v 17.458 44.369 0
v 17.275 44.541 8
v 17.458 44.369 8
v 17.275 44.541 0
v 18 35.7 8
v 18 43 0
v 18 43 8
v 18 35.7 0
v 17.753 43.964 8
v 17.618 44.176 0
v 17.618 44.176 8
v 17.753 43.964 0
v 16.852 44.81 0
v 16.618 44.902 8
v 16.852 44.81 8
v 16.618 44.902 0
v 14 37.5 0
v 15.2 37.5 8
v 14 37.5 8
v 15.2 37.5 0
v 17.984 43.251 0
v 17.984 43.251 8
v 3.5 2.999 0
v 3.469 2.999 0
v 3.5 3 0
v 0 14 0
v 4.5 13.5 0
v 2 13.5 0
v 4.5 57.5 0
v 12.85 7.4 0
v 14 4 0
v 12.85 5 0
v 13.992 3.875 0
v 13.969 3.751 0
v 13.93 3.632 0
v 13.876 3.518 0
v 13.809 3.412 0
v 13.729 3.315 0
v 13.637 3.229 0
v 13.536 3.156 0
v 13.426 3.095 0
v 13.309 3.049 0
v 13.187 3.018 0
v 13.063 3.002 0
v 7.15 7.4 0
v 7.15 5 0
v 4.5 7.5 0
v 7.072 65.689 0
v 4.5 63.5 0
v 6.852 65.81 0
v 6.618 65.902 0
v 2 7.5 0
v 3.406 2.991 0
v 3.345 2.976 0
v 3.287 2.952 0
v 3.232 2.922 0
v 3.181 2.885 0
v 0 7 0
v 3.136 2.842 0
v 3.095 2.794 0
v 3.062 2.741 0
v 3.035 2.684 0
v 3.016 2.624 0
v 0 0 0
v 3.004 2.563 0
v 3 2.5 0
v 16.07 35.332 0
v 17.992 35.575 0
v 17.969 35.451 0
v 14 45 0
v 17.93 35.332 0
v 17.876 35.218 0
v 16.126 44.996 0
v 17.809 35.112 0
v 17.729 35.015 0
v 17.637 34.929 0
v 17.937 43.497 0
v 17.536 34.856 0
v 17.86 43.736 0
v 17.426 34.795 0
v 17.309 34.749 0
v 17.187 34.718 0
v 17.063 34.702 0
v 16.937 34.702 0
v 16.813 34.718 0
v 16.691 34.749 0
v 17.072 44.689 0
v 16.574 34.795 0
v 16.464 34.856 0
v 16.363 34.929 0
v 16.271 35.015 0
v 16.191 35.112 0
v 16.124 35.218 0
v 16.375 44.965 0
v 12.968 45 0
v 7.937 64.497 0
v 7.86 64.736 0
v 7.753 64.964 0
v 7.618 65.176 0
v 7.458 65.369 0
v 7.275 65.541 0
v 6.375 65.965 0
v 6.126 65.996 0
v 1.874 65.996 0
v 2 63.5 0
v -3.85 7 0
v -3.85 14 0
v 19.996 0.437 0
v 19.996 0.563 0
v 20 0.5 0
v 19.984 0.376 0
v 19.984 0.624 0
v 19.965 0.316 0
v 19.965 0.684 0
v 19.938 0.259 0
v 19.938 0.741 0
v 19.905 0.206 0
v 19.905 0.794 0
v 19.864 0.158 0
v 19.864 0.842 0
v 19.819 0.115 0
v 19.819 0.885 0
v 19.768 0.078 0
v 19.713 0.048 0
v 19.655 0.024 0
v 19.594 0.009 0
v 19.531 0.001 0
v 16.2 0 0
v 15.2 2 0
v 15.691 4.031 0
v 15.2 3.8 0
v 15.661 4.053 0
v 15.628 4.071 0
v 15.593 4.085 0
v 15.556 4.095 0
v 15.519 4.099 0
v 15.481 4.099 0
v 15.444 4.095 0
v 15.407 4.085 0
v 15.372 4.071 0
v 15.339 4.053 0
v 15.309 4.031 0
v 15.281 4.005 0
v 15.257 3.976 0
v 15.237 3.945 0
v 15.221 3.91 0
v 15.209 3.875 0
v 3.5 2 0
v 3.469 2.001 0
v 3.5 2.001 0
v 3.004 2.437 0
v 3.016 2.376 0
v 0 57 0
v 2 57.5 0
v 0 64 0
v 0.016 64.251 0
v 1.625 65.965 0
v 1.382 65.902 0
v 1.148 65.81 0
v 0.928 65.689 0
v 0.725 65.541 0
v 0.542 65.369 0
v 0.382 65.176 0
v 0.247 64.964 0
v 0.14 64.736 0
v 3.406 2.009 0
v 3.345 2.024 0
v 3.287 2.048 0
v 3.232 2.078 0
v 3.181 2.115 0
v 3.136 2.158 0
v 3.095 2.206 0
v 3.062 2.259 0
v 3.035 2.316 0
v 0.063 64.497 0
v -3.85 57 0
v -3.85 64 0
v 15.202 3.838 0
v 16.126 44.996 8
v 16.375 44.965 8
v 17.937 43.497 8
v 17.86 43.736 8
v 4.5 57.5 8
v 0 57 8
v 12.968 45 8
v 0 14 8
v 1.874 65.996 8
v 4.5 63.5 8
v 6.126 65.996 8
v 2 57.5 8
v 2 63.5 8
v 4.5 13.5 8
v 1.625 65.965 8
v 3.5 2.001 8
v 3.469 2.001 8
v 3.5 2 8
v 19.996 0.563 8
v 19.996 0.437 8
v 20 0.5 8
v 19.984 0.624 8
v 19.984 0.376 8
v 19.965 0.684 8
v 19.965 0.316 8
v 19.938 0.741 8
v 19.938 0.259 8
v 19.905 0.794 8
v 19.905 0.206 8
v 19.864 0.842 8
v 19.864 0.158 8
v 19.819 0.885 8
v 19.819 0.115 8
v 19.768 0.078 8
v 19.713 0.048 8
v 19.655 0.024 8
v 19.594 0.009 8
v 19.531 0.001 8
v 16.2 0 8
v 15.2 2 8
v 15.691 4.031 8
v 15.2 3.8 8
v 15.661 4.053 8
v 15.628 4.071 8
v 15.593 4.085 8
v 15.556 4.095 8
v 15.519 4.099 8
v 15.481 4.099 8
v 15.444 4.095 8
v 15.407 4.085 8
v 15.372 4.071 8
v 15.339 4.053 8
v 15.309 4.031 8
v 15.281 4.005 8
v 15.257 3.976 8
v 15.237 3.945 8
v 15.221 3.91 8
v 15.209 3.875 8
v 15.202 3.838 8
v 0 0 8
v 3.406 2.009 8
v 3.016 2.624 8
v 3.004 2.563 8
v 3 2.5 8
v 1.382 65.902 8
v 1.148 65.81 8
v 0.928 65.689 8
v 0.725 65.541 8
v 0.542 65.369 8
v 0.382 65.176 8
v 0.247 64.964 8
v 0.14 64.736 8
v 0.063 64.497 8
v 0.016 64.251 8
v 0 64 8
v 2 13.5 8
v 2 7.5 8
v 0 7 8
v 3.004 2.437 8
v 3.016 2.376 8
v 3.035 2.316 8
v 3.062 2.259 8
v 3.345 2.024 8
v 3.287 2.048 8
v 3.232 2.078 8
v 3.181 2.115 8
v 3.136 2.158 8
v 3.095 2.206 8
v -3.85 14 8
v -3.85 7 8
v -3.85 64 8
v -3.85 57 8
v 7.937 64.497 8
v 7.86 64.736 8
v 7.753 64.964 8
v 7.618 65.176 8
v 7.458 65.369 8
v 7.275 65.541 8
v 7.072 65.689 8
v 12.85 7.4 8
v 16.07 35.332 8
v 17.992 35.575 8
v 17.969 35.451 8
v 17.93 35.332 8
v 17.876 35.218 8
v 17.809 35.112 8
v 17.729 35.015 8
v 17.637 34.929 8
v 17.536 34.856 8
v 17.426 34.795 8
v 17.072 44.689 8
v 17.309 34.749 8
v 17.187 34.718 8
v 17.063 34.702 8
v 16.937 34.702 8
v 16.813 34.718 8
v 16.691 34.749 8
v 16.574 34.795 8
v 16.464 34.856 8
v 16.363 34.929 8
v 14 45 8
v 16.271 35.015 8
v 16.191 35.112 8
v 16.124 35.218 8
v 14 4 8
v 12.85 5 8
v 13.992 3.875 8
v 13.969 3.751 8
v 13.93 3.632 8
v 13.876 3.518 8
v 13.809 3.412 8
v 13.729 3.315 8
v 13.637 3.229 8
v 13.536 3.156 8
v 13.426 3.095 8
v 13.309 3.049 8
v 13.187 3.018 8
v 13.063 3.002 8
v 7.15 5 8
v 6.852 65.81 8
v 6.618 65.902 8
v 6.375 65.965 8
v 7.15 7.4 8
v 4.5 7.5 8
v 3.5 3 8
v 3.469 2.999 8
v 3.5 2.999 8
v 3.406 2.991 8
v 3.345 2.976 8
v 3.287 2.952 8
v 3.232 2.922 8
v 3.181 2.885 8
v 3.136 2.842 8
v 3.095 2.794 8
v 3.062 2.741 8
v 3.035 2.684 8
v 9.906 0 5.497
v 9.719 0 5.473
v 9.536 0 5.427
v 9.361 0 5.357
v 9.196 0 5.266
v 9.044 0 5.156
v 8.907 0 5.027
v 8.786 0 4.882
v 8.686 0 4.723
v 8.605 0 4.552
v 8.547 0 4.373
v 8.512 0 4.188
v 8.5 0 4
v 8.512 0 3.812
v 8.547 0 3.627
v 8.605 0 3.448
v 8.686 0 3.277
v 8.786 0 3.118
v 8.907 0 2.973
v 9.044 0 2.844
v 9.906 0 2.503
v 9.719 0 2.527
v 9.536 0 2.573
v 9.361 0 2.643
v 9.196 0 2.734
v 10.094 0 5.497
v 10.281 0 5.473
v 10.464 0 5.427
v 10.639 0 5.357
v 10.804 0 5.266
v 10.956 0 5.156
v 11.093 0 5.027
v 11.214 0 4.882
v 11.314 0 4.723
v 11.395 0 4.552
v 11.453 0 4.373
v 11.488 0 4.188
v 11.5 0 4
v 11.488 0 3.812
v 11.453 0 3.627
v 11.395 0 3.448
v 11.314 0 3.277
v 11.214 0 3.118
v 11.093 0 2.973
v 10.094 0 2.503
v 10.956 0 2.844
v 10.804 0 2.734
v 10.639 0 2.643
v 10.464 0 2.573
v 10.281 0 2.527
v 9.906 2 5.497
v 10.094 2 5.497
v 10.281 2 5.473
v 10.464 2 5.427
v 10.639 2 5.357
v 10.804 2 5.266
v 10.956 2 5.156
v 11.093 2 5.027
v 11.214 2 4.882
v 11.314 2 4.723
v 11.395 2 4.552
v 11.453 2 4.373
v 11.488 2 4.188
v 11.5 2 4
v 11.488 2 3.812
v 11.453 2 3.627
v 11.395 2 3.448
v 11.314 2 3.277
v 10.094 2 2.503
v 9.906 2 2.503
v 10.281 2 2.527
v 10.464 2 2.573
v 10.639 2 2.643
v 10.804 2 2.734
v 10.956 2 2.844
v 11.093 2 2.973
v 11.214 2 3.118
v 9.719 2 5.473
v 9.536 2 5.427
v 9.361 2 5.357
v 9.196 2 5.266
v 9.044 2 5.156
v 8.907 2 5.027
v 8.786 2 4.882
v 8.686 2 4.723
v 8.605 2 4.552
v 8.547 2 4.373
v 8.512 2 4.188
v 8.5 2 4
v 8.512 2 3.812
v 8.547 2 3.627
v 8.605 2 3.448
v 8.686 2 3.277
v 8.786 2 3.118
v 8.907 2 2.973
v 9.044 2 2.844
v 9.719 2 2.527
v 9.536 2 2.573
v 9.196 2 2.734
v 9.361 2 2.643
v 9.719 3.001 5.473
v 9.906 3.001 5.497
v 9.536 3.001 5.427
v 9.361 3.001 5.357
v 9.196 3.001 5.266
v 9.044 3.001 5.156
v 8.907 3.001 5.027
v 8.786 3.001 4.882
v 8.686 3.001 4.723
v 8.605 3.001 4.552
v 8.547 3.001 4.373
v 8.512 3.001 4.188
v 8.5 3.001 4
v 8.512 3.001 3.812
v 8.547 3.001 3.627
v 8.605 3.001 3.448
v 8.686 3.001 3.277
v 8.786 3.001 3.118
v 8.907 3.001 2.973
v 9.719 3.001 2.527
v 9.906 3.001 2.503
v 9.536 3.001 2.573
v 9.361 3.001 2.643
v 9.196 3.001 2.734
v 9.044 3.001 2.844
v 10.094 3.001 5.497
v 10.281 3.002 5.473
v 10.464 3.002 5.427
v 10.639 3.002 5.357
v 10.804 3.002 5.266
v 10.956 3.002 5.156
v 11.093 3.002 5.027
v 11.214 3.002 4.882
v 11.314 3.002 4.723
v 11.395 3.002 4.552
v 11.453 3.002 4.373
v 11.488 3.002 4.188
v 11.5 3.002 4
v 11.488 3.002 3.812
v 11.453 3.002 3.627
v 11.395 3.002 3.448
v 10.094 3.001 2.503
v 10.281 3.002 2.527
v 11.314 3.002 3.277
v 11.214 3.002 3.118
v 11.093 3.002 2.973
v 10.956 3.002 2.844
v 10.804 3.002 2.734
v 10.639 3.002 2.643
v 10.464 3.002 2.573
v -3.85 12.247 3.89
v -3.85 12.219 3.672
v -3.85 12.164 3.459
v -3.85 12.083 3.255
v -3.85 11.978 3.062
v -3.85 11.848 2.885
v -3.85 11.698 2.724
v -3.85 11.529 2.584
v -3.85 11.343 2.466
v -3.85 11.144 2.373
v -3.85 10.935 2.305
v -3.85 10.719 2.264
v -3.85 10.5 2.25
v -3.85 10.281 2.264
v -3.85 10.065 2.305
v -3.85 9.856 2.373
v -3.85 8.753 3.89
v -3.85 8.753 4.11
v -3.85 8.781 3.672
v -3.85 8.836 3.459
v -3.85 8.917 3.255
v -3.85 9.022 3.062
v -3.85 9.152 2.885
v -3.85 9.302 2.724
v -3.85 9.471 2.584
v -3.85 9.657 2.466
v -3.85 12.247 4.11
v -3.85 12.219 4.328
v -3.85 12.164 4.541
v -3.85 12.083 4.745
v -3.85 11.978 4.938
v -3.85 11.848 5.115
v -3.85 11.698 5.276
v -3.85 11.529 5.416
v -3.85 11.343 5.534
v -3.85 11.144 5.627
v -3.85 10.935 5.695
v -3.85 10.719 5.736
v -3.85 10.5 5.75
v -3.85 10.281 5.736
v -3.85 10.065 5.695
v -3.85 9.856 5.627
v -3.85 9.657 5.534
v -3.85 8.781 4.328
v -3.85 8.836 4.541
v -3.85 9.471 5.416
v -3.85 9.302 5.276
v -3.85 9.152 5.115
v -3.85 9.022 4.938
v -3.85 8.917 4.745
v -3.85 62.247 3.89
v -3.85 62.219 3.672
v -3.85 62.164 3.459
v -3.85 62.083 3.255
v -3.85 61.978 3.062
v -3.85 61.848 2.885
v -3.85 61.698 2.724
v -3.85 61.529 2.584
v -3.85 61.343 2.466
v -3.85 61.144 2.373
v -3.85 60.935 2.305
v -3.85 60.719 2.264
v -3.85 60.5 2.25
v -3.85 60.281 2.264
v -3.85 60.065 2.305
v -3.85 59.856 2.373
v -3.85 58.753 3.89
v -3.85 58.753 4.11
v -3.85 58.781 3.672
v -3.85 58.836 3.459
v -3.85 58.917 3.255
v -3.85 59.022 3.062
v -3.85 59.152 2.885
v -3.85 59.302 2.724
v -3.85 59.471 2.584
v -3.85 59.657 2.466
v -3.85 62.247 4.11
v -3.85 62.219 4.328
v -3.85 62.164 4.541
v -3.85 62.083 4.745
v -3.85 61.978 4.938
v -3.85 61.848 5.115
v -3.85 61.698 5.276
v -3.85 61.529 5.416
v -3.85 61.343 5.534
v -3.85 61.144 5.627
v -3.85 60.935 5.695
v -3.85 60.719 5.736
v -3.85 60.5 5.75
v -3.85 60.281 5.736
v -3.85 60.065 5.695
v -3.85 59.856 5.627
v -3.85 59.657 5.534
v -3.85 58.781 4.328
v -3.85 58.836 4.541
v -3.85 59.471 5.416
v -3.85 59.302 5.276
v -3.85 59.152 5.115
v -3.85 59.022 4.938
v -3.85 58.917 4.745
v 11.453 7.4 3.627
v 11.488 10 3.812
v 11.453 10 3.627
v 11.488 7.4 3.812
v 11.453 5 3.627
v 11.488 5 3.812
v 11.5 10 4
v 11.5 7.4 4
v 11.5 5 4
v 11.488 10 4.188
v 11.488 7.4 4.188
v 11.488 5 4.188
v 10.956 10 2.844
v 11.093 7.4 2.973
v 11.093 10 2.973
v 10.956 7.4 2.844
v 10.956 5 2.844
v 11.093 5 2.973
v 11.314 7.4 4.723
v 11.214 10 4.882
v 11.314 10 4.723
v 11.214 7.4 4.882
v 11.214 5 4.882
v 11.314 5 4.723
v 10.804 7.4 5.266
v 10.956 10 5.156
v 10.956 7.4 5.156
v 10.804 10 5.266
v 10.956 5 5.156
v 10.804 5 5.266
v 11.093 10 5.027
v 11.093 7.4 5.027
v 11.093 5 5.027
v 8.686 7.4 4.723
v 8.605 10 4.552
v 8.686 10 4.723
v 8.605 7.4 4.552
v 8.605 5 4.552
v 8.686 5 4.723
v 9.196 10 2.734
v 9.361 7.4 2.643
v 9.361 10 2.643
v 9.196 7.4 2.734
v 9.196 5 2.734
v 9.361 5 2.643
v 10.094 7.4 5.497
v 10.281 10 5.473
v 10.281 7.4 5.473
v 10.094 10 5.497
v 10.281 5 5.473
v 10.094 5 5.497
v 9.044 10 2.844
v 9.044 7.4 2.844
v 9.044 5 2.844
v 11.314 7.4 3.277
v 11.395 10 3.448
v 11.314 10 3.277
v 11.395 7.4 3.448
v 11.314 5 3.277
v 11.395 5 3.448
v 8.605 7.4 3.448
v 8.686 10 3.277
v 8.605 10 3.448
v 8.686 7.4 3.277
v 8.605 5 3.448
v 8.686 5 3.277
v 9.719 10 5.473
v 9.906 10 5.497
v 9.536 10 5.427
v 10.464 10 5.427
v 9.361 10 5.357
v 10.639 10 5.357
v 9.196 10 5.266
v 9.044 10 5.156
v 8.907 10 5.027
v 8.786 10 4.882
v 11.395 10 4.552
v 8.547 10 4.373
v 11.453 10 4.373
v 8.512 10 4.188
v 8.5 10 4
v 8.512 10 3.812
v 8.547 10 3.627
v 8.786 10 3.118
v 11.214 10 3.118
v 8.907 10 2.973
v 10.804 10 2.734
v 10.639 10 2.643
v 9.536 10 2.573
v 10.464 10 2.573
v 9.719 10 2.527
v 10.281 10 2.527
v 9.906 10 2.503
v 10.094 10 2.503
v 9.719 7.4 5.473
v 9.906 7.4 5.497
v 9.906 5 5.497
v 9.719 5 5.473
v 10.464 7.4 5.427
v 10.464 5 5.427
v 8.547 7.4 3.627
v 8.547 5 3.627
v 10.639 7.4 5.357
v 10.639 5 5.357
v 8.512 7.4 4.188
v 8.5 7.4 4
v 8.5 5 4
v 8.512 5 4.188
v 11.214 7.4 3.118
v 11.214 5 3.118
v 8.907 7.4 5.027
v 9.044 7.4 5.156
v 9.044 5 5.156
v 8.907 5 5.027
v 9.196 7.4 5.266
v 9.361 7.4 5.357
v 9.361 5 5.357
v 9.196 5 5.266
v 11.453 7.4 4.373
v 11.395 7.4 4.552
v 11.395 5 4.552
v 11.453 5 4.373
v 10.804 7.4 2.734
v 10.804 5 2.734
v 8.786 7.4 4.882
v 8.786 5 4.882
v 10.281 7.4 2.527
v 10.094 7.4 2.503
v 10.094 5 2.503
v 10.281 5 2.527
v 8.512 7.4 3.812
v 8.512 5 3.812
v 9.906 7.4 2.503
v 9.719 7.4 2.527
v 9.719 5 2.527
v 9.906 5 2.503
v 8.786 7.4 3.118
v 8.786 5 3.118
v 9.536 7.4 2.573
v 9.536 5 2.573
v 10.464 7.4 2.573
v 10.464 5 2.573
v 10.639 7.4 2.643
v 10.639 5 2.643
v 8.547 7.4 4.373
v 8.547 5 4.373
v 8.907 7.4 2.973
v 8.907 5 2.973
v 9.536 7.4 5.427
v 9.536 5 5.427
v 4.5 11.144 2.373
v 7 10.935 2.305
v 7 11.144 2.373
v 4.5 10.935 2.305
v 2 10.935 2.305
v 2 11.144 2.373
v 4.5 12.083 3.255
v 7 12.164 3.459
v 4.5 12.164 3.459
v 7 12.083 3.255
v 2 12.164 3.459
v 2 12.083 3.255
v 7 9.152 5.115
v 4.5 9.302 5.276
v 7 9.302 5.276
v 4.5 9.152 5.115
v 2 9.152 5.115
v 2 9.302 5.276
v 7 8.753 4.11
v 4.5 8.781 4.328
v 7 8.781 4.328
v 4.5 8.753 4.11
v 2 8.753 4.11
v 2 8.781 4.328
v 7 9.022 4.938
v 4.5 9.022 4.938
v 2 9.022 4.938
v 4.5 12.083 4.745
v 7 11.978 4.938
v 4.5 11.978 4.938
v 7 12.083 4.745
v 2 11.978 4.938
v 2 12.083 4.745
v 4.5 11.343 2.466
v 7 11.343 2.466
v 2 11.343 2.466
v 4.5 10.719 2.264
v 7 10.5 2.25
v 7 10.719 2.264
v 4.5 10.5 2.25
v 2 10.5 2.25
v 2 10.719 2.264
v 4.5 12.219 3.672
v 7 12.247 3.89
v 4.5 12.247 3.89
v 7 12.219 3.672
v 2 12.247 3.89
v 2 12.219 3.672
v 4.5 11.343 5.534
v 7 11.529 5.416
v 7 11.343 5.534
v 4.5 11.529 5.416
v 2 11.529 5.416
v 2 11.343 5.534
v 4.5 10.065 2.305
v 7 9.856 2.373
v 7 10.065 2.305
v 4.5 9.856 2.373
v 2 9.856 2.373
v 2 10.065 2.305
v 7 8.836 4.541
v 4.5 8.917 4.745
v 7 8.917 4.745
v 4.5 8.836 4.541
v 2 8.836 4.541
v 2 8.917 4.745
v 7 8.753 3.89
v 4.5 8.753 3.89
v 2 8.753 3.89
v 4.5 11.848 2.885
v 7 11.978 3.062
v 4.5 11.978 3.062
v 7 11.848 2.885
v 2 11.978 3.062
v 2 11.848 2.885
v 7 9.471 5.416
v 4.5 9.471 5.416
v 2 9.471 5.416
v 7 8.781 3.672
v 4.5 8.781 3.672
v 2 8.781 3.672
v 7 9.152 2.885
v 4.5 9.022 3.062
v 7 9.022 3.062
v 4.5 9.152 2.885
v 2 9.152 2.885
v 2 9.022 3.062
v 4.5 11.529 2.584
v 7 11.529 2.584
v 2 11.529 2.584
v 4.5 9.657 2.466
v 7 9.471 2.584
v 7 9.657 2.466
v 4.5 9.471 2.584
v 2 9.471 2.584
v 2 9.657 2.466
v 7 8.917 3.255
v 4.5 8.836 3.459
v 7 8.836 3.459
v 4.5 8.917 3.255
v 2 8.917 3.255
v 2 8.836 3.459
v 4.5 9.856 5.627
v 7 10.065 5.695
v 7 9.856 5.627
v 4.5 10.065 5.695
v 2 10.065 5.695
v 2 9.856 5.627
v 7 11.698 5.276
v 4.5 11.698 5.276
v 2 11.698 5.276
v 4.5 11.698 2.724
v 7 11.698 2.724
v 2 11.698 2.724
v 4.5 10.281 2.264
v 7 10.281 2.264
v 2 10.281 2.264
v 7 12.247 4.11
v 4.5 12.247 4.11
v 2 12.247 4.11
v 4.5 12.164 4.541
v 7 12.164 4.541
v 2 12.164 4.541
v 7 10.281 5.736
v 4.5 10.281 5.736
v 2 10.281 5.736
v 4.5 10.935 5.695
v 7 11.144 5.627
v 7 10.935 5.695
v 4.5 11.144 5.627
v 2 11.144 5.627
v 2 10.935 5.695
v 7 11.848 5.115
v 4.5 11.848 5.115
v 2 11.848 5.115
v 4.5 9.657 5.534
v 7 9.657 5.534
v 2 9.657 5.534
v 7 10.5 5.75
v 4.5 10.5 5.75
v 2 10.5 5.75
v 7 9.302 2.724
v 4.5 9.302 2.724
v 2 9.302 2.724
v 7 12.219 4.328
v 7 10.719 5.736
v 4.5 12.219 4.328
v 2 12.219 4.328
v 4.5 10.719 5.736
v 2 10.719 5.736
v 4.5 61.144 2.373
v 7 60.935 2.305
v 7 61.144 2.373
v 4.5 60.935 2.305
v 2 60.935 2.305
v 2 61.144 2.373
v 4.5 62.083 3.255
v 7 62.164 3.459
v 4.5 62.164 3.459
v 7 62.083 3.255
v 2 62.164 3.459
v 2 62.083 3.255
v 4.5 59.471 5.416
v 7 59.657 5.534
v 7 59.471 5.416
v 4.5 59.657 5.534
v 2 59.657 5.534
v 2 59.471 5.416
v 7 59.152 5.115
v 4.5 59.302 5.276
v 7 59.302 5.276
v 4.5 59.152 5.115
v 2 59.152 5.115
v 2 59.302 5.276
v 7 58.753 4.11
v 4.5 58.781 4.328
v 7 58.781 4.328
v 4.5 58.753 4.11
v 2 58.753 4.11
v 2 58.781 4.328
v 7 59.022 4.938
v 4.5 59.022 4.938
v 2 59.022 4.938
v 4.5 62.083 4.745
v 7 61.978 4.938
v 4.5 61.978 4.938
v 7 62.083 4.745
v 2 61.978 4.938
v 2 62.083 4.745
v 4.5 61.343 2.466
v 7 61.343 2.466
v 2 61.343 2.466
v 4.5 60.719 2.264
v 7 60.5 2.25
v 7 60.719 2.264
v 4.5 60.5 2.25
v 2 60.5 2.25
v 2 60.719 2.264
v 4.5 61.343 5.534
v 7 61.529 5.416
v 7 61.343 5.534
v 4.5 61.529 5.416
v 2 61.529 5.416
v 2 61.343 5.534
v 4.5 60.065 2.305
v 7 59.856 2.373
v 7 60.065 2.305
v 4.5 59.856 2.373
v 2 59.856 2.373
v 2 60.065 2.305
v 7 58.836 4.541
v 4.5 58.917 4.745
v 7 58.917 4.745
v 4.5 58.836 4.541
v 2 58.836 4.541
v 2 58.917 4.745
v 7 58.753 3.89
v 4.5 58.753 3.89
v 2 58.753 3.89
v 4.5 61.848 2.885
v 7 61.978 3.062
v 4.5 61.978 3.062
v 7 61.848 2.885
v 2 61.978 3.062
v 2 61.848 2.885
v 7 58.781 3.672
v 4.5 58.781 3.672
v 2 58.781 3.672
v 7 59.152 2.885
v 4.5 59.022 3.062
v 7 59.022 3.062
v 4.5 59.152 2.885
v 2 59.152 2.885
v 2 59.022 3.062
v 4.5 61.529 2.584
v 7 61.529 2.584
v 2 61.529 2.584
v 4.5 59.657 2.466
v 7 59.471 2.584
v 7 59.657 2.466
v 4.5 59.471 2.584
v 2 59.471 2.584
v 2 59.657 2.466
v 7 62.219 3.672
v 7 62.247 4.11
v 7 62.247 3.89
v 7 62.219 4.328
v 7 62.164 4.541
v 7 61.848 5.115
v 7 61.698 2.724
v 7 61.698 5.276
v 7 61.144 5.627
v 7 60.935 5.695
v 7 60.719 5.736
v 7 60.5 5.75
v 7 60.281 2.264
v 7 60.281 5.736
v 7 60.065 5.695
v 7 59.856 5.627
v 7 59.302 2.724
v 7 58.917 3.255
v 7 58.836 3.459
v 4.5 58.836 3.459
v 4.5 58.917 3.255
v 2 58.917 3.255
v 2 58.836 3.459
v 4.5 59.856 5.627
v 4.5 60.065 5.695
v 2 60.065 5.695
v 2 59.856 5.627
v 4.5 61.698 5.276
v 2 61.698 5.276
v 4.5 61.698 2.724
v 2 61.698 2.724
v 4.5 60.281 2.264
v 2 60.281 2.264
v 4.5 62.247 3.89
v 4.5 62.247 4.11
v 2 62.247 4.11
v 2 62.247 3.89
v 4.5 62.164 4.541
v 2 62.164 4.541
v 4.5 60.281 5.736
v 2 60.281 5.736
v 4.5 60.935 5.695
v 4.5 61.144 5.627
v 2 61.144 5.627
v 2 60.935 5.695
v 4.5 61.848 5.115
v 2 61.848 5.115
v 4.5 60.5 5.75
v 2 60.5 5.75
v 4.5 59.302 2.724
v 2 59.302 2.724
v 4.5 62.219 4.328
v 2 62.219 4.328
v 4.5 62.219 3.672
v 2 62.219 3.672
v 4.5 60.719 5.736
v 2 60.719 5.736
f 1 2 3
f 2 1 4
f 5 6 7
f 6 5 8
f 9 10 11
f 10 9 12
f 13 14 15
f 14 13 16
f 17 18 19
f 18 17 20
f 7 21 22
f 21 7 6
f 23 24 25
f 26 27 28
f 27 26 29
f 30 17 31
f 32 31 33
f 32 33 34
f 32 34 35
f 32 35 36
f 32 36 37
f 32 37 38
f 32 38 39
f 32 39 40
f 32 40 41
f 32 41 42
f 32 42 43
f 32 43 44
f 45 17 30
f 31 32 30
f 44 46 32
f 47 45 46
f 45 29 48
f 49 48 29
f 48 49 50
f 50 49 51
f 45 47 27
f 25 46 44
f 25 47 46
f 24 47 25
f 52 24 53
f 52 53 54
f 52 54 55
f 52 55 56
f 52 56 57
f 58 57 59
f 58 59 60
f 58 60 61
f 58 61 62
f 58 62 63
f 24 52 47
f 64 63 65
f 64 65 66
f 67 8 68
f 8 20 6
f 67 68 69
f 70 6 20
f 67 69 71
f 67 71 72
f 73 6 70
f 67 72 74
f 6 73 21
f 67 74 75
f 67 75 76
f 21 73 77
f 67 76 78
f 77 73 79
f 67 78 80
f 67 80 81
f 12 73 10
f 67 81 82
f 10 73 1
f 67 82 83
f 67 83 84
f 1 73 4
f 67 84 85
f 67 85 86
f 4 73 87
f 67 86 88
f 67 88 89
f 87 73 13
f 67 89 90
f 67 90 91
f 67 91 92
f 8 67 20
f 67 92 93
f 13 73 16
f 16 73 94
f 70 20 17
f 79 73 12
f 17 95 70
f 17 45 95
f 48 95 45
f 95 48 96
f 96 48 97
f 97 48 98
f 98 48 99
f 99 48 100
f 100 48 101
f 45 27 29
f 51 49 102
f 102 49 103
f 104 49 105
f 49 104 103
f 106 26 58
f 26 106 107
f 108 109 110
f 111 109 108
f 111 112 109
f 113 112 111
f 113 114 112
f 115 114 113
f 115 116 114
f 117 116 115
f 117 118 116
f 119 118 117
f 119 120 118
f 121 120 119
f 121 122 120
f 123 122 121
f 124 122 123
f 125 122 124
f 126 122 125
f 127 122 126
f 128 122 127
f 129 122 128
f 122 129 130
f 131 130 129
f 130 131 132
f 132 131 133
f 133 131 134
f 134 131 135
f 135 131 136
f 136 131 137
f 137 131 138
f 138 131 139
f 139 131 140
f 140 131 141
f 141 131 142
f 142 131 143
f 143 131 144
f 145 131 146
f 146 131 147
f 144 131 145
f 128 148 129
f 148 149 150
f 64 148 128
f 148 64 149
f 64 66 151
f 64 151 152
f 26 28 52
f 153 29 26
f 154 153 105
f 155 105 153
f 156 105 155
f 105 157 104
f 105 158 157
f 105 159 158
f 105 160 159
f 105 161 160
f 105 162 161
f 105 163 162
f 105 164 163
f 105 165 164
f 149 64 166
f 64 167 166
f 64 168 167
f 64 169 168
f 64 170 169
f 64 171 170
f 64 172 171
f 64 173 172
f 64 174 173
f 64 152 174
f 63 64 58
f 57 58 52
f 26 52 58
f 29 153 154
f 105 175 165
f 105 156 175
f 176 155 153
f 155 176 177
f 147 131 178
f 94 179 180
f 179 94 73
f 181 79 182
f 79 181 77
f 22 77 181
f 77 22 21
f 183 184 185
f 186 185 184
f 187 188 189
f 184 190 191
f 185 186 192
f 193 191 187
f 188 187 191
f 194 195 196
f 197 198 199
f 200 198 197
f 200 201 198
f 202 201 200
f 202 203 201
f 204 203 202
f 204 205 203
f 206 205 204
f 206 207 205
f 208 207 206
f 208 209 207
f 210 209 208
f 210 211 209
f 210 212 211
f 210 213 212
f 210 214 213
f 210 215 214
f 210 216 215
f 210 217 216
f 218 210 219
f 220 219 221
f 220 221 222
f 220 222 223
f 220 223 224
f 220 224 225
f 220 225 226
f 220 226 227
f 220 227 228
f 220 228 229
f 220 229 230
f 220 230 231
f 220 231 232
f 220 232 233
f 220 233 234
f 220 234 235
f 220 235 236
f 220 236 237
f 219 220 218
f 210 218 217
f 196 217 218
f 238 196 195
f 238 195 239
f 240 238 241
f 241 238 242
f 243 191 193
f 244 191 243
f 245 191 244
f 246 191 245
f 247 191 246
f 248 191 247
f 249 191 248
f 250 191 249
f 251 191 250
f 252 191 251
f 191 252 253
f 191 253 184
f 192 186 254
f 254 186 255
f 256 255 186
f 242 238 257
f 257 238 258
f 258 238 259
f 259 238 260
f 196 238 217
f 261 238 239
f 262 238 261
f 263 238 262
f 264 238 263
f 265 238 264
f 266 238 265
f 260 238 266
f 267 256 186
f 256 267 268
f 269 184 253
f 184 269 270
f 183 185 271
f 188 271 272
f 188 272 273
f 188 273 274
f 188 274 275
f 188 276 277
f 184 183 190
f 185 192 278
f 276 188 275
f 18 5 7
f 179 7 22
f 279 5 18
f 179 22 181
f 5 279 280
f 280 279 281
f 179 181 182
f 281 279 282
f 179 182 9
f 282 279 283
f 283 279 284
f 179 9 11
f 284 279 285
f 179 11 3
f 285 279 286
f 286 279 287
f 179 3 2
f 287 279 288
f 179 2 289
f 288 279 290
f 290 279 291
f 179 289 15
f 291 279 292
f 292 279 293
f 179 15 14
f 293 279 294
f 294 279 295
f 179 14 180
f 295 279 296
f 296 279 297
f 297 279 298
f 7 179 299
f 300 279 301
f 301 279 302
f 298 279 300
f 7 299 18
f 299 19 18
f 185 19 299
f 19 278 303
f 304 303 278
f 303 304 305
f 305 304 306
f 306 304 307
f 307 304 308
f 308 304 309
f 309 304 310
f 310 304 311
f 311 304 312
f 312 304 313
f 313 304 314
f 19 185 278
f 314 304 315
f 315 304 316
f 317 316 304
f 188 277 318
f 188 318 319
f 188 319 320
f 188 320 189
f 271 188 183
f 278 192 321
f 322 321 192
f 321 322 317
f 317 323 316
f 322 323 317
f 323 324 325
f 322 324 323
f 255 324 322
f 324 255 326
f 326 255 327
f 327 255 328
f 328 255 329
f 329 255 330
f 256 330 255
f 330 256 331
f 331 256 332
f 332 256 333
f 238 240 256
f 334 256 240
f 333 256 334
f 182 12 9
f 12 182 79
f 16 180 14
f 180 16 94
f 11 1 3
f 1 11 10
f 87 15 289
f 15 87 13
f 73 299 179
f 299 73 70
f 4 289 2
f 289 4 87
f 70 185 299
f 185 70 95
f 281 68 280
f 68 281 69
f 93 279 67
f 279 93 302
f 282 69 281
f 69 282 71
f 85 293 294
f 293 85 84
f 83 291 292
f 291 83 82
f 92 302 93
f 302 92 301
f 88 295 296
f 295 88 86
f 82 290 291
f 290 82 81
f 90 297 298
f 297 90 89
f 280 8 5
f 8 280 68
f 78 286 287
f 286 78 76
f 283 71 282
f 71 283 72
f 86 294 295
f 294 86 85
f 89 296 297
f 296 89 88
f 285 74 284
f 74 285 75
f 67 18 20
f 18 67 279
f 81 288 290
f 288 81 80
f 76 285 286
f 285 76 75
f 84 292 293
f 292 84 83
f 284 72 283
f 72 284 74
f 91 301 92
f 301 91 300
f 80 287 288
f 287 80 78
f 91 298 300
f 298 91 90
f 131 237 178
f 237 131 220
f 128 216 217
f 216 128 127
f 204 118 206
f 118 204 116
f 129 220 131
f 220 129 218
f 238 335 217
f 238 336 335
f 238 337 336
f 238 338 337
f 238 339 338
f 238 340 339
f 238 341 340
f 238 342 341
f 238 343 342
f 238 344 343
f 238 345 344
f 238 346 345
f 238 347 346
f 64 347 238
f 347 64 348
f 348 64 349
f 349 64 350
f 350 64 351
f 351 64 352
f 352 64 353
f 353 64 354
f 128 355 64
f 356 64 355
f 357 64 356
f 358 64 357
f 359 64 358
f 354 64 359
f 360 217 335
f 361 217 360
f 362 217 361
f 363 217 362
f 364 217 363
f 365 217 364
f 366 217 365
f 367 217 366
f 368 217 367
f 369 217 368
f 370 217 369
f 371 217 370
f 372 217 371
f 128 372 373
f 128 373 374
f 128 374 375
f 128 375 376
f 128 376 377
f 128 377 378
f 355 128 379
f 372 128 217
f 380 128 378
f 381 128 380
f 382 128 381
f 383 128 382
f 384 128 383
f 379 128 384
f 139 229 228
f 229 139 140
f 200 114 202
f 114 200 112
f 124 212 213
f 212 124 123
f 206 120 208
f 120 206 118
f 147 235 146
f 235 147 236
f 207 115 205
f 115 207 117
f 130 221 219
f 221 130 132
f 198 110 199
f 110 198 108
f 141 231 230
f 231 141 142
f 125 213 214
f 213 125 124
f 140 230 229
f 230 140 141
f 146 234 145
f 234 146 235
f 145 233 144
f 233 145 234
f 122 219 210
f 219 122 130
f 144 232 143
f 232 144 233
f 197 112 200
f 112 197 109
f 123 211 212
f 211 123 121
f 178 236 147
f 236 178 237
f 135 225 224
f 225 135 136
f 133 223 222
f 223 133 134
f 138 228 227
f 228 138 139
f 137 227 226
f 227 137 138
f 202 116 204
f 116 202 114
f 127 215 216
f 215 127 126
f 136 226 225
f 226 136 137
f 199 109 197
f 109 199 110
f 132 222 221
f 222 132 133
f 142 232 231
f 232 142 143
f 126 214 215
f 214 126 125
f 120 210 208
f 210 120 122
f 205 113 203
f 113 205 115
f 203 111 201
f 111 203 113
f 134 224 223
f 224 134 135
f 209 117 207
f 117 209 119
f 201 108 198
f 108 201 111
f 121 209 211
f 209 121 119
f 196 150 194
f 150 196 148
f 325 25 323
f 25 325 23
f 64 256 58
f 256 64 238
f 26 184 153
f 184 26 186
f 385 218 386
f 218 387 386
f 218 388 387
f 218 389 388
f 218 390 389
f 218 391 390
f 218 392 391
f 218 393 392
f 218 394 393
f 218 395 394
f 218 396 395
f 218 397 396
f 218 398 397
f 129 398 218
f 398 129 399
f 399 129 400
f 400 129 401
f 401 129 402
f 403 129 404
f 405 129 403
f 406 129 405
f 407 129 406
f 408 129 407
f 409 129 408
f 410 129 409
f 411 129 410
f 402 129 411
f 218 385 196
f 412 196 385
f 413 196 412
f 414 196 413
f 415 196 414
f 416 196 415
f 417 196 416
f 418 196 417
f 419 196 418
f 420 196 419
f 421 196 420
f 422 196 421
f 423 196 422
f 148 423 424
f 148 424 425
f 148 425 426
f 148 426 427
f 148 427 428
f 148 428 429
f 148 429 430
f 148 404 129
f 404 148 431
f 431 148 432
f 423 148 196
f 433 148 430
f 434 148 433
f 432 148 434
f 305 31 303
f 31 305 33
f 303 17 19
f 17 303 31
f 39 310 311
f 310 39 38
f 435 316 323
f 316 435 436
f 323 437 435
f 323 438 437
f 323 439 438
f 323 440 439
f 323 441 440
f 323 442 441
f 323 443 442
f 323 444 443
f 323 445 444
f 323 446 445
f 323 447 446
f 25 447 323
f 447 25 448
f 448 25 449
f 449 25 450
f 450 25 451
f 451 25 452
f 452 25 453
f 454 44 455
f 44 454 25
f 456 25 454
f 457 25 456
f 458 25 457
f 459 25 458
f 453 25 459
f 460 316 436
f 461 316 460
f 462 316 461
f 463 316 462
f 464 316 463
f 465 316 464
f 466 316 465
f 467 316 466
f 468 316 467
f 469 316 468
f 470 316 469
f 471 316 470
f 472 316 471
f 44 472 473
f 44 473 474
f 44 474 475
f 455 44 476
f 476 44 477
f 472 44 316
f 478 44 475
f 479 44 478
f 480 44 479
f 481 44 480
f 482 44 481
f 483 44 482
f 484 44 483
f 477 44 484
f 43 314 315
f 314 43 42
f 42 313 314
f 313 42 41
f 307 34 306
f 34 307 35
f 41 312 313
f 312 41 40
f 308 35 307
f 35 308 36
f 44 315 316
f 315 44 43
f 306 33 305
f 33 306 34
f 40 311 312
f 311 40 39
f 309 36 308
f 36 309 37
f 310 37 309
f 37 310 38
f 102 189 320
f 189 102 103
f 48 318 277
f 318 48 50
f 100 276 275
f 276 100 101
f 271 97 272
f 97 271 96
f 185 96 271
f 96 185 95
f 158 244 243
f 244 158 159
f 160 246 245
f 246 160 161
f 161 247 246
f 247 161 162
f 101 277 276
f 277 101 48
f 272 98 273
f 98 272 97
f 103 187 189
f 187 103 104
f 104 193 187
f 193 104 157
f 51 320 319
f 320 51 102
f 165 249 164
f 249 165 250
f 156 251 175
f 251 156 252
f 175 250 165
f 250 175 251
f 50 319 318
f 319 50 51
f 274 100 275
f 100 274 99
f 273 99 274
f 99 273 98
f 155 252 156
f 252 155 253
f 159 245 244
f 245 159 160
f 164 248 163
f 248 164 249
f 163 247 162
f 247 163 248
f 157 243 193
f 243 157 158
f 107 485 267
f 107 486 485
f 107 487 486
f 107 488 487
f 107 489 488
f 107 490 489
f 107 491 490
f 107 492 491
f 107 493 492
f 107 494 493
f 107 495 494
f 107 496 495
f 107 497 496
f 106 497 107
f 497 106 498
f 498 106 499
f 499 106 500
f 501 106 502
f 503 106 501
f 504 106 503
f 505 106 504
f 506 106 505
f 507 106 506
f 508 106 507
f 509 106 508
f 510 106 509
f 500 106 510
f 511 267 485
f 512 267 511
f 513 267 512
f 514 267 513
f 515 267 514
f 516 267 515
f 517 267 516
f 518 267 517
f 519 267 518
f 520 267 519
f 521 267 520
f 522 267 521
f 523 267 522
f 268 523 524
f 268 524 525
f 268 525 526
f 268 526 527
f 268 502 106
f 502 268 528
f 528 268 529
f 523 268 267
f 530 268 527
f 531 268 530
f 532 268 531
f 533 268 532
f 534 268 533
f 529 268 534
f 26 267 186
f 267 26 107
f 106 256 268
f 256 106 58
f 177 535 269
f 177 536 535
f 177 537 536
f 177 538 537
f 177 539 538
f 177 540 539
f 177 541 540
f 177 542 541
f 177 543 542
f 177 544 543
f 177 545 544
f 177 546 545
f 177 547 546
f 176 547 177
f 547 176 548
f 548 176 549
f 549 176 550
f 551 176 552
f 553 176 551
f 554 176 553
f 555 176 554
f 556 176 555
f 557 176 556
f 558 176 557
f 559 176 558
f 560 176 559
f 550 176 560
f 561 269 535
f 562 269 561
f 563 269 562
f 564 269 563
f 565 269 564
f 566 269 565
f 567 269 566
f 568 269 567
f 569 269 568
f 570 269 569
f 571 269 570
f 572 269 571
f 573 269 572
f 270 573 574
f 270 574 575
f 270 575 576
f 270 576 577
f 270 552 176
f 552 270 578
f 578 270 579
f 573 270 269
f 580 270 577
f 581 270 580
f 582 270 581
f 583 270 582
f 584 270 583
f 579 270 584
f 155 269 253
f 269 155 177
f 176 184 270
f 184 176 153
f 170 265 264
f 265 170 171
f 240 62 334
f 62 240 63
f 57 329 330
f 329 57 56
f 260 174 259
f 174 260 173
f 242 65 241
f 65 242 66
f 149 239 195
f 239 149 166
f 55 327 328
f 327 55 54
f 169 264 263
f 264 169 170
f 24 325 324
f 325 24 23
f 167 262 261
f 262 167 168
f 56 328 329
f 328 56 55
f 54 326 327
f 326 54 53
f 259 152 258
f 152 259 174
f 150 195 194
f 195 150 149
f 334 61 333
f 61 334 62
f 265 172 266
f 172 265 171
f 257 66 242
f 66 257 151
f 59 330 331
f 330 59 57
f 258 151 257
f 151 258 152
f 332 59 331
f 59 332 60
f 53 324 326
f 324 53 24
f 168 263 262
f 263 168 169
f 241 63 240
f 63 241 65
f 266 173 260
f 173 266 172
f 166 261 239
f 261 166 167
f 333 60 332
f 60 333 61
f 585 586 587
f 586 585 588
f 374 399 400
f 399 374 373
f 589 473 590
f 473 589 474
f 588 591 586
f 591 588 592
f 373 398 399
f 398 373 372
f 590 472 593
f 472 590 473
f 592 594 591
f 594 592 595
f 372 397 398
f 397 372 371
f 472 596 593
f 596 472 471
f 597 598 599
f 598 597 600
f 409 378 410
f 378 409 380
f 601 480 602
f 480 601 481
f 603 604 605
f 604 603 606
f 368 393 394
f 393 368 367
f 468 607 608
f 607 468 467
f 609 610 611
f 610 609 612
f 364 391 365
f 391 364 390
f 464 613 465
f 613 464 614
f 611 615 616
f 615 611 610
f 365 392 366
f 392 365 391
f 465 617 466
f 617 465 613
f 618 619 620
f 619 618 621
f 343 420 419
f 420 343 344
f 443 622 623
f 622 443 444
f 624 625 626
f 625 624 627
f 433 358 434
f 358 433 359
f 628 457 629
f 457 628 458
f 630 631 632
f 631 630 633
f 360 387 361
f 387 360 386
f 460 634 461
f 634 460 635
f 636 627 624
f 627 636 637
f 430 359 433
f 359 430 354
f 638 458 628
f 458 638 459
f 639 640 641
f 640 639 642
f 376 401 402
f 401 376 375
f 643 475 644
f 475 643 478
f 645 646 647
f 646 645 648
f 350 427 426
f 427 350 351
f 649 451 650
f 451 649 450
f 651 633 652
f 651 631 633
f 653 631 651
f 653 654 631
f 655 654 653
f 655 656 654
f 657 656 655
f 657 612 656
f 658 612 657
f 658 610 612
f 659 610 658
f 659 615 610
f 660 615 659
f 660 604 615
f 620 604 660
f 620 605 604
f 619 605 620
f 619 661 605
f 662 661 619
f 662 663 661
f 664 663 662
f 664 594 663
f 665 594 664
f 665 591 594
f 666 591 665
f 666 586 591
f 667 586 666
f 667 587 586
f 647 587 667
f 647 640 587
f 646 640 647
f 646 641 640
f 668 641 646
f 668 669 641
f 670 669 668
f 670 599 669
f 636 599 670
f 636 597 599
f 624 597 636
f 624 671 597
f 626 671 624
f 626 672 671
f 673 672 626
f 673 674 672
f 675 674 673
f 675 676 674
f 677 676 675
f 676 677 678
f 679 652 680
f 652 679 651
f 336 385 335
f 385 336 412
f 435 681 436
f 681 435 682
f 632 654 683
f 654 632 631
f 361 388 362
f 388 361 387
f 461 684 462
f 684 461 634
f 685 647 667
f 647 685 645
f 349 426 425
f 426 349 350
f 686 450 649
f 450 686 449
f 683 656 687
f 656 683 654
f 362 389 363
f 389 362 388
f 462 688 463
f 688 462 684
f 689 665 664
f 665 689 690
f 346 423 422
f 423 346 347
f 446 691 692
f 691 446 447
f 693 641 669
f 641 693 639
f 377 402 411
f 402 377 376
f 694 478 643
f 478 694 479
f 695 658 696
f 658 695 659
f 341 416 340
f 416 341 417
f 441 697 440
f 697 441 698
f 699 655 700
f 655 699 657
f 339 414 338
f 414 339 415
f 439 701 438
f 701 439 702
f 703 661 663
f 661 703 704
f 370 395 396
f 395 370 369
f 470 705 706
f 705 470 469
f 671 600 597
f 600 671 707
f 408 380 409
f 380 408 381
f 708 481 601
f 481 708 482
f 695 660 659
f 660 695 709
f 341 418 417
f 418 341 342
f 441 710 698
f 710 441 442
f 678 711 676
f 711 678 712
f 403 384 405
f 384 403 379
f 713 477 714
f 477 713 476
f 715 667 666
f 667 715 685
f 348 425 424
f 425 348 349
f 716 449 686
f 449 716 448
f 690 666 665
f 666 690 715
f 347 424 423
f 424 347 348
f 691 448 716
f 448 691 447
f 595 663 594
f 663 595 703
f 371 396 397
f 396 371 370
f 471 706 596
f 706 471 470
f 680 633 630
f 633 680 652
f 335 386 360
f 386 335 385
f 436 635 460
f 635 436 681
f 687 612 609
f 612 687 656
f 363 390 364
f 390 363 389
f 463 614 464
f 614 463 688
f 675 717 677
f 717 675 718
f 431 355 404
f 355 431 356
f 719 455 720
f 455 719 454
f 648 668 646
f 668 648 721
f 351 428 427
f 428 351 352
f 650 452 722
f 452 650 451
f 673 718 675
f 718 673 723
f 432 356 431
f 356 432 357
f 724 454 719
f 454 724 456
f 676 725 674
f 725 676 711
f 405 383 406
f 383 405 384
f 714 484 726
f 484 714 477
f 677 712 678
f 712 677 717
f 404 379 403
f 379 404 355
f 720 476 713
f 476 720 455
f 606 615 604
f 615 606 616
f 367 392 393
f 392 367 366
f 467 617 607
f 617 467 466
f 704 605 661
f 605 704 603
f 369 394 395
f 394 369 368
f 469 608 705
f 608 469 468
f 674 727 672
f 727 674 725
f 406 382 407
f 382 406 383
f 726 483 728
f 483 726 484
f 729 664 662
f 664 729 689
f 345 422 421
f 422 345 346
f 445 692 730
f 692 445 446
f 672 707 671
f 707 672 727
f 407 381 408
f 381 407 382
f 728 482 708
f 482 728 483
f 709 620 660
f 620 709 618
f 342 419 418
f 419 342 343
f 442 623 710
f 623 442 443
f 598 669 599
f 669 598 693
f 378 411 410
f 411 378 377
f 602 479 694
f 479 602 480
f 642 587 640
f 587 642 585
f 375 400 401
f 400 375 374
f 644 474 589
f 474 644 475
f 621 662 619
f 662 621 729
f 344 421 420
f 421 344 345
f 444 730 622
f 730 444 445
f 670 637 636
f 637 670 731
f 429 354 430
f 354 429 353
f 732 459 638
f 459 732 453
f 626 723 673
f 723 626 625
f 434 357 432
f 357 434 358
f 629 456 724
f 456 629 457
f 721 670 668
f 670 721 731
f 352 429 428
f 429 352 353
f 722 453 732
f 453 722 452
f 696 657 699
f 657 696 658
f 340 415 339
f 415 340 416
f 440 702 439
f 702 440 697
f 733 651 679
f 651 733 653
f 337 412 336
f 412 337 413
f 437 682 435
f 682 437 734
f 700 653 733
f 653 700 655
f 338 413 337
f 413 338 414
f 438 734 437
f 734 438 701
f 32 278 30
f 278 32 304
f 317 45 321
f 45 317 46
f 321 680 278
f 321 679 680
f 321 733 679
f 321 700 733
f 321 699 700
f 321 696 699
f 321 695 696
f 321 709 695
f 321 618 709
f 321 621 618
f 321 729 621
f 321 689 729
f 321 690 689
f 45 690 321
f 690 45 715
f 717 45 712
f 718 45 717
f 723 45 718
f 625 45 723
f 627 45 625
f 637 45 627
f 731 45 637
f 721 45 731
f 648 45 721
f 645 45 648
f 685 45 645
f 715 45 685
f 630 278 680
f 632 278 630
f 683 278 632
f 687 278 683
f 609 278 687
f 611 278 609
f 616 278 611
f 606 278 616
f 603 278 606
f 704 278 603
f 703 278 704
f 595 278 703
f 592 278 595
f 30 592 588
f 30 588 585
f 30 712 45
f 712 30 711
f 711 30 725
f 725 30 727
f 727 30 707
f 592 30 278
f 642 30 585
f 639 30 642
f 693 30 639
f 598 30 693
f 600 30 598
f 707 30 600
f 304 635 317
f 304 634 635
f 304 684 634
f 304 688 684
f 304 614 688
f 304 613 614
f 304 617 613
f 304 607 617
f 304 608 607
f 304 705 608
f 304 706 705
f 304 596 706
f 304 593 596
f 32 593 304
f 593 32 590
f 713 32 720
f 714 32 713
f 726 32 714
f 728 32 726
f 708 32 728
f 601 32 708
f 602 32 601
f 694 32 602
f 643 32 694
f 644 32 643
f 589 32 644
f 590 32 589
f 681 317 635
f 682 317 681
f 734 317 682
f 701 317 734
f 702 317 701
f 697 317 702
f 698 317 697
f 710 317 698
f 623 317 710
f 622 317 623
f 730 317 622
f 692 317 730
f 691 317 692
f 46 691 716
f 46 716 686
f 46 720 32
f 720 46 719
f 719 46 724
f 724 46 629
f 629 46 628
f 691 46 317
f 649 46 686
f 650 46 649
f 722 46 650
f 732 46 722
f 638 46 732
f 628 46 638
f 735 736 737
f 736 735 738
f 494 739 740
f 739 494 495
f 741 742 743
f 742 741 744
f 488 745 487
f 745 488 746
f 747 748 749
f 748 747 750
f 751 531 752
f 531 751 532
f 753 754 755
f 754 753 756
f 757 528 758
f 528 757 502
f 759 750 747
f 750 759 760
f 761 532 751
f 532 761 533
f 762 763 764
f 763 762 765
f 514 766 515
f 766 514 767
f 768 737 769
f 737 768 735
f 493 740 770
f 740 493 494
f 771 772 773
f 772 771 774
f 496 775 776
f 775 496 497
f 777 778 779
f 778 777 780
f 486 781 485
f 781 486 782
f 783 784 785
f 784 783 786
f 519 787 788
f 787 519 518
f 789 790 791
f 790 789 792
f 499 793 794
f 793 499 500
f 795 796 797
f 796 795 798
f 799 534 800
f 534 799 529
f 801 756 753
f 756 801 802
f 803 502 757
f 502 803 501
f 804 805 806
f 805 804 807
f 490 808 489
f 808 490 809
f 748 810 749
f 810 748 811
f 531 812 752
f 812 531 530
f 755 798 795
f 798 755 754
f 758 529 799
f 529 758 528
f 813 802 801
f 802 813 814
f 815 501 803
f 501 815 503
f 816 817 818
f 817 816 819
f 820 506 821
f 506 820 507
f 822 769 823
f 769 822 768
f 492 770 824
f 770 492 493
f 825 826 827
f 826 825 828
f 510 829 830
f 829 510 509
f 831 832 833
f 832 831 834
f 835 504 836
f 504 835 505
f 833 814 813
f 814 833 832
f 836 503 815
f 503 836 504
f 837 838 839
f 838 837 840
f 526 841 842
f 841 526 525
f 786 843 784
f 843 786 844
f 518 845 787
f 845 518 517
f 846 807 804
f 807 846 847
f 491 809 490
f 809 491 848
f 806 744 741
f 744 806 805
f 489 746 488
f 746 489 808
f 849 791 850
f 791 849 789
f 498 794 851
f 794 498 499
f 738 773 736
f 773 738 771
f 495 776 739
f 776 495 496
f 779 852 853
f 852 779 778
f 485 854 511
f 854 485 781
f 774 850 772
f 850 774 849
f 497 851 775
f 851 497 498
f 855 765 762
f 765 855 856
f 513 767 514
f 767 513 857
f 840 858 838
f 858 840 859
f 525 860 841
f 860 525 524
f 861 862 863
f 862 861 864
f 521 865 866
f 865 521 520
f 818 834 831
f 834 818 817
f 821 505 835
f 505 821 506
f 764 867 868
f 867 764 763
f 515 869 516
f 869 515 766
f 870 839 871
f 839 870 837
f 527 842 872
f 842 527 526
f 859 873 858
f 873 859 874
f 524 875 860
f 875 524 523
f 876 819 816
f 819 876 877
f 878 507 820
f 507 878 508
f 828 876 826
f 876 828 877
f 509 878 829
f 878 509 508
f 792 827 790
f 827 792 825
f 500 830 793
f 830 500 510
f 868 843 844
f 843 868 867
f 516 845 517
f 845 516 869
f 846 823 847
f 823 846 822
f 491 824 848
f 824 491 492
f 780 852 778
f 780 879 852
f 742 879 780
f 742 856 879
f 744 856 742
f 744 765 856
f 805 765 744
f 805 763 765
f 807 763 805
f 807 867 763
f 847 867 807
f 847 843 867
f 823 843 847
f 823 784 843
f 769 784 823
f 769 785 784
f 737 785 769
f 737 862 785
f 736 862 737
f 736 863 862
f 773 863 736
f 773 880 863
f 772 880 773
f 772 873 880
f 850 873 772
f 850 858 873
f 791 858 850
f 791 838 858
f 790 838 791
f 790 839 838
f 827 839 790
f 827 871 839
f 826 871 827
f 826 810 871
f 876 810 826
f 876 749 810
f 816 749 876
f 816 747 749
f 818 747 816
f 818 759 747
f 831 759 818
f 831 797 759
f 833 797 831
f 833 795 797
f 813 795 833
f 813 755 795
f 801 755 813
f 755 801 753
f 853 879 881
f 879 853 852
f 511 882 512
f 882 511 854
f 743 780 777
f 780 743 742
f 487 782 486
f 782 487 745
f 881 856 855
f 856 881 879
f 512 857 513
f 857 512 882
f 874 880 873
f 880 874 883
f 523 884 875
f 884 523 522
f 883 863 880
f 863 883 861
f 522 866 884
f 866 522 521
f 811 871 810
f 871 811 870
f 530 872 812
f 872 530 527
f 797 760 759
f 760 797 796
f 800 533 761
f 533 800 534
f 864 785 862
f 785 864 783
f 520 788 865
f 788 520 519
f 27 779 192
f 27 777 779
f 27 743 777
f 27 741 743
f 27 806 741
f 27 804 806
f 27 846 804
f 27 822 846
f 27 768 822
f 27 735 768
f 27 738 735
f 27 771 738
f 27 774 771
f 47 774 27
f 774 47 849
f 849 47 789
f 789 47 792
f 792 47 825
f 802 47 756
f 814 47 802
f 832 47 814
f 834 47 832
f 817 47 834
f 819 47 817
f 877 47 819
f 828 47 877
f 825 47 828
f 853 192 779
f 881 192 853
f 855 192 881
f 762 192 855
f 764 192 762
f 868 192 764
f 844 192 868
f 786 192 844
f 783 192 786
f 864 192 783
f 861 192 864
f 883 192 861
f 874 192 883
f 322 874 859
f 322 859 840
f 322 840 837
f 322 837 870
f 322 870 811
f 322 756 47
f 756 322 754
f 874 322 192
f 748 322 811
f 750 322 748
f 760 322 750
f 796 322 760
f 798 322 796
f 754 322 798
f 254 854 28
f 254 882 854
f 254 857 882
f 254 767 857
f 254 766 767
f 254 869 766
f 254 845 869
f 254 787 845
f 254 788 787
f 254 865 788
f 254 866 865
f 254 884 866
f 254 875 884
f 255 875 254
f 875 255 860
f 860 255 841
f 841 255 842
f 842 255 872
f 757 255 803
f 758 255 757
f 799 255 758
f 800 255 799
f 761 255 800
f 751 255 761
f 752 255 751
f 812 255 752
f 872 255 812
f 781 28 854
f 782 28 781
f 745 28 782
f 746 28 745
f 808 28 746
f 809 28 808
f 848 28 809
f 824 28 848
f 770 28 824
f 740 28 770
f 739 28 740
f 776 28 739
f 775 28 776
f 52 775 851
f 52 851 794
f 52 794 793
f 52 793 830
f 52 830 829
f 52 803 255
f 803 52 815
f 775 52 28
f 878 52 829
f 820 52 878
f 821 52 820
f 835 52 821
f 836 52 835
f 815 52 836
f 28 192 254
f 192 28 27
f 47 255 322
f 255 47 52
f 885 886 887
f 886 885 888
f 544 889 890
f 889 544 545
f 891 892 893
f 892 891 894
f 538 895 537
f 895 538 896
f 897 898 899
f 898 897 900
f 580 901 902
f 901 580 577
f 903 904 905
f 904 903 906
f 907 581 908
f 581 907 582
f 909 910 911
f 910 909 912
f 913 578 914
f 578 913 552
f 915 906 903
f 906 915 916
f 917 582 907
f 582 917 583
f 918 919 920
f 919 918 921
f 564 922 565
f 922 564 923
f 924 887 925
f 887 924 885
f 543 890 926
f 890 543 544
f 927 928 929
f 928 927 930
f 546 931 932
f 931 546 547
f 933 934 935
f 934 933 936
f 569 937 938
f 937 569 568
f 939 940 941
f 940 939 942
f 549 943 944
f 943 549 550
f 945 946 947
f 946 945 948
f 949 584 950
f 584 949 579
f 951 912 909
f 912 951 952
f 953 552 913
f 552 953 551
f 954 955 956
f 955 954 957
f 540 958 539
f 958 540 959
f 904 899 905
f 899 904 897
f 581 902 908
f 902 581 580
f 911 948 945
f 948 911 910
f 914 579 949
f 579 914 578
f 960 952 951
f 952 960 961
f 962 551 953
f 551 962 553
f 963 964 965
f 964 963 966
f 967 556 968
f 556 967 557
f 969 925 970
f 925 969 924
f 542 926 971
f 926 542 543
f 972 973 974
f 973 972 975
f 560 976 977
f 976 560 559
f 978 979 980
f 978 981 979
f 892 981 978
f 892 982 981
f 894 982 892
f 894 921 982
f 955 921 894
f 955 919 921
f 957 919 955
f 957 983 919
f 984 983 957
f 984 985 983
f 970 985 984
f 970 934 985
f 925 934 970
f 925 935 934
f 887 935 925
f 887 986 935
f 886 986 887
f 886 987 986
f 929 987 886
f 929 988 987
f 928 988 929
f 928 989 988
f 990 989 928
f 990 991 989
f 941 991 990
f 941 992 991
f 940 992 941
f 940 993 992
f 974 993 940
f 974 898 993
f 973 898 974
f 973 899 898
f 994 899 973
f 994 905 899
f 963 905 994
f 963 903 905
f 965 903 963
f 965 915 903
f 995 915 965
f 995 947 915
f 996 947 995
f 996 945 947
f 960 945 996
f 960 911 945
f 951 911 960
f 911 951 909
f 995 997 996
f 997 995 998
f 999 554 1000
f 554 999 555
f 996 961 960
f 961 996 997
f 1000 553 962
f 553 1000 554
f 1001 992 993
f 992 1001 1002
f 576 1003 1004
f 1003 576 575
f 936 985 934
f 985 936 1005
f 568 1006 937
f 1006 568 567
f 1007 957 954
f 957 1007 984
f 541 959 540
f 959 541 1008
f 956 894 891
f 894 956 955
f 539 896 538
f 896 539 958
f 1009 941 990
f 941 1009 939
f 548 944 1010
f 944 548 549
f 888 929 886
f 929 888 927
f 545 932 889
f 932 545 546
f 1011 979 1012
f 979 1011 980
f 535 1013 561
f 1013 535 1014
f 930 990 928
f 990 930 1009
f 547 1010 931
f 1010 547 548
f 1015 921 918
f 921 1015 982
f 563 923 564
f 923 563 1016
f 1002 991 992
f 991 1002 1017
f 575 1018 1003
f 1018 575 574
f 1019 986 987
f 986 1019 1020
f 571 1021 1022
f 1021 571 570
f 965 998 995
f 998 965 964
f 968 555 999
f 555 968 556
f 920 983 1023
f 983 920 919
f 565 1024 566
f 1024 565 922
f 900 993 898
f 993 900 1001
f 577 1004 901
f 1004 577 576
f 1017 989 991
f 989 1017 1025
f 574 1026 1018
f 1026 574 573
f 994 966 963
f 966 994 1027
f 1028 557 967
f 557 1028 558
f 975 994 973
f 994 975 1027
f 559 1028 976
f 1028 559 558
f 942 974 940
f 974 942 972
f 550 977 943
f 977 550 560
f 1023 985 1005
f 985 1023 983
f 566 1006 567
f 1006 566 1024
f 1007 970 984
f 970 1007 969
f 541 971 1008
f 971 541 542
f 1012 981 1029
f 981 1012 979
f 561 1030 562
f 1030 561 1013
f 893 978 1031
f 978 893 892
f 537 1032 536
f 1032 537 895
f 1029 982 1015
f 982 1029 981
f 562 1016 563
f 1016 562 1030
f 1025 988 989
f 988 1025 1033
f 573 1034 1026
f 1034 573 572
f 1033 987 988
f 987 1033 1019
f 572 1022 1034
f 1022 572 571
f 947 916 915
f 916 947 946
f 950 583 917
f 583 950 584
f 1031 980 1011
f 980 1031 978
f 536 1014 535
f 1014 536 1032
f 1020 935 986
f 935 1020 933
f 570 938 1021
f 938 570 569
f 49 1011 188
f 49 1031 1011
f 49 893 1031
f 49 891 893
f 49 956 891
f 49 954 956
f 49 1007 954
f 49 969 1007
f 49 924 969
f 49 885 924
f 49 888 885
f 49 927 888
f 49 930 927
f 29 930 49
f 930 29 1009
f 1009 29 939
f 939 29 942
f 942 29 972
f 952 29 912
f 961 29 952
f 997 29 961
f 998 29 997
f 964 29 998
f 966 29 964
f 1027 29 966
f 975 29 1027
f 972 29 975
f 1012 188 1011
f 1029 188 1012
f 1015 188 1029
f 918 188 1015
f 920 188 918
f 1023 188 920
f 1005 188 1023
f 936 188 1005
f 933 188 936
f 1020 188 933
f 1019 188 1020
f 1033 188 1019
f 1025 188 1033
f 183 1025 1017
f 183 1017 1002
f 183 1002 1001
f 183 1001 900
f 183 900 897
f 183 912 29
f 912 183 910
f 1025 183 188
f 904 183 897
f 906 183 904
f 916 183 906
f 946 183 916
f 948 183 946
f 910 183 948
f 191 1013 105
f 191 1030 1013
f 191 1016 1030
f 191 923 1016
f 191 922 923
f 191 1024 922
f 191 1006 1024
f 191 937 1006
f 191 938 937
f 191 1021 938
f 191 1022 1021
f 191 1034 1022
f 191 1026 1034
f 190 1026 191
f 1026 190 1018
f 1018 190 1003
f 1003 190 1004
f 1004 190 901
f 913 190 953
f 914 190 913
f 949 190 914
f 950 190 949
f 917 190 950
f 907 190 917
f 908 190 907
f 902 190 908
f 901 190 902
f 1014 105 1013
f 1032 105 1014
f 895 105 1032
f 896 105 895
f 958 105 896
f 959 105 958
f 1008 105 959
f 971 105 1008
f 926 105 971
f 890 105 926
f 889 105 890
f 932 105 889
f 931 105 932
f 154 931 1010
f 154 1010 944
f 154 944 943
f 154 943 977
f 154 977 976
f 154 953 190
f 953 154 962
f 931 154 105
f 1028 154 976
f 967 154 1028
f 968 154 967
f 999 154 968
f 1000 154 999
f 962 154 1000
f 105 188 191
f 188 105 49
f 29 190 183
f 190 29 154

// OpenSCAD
//-------------------------------------------------------------------
// title: DIN clip
// author: OK1HRA 
// license: Creative Commons BY-SA
// URL: http://remoteqth.com/3d-din-rail-mount-clip.php
// Original revision: 0.1
// revision: 0.2b Contributed by John Cabrer
// format: OpenSCAD
//-------------------------------------------------------------------
// HowTo:
// Determine the center to center hole spacing of the device to mount (mount_hole_spacing)
// Pick a metric screw size, and length
// Pick a nut width and height
// See http://mcmaster-carr.com/ for drawings of all screws and nuts.
// The mount post length is calculated based on the screw length
// After after making your changes, press F5 to re-render them to the screen
// .STL export press F6 and menu /Design/Export as STL...

// ----- Inside Hole Calibration Values --------
// To use, print out a part with default values (i.e. mount_nut_width = 8,
// actual_measurement = 8)
// Measure the resulting hole width of the nut, and type that value as the actual measurement. Render and export. Print again.
// The gain_adjust value will insure that holes measure as they should.

expected_measurement = 8;
actual_measurement = 8;
gain_adjust = expected_measurement / actual_measurement; // Default = 8/8 = 1

//----------------- Mounting Screw Input Parameters ---------------------------------
plate_thickness = 1.65;    // This is the thickness of the thing being mounted
mount_hole_spacing = 50;    // mount_hole_spacing between mounting holes. 31mm for LCD1602. 50mm for relay module
mount_screw_length = 10; // Min = 6
mount_screw_thread_diameter = 3.5;    // Min = 1, Max = 6
mount_nut_width = 6;   // Max = 10
mount_nut_height = 2.5;   // Max = 5

//----------------- Mounting Srew Input Parameters, Default is M3x8 ---------------------------------
lock_screw_length = 8; 
lock_screw_thread_diameter = 3 * gain_adjust;
lock_nut_width = 5.5 * gain_adjust;
lock_nut_height = 2.4 * gain_adjust;

//----------------- Calculated Parameters
standoff_length = mount_screw_length - (mount_nut_height * gain_adjust) - plate_thickness - 2;
$fn=50;
width = 8; 
r_mount_screw = (mount_screw_thread_diameter * gain_adjust) / 2;      // Radius of the mounting screw threads
r_lock_screw = (lock_screw_thread_diameter * gain_adjust) / 2;
expand = 1;      // 0-x
long = 45;

din();

module din(){
	difference() {
		union() {
			hull() {
				translate([15+expand,long-2,0]) {
                    cylinder(h=width, r=2, center=false);}

                translate([12+expand,37.5,0]) {
                    cube([5,1,width], center=false);}

                translate([12+expand,long-1,0]) {
                    cube([1,1,width], center=false);}
            }

			hull() {
				translate([16+expand,35.7,0]) {
                    cylinder(h=width, r=1, center=false);}

                translate([14.2+expand,37.5,0]) {
                    cube([2.8,1,width], center=false);}
            }

			hull() {
				translate([18.5+expand,0.5,0]) {
                    cylinder(h=width, r=0.5, center=false);}
				translate([14.5+expand,3.8,0]) {
                    cylinder(h=width, r=0.3, center=false);}
				translate([14.2+expand,0,0]) {
                    cube([1,1,width], center=false);}
			}

			cube([3.5,4,width], center=false);
            cube([15+expand,2,width], center=false);

			hull() {
				translate([12+expand,4,0]) {
                    cylinder(h=width, r=1, center=false);}

                translate([0,3,0]) {
                    cube([1,1,width], center=false);}

                translate([0,long-1,0]) {
                    cube([13+expand,1,width], center=false);}
            }

			hull() {
            translate([0,40,0]) {
                cube([14,1,width], center=false);}

            translate([2,mount_hole_spacing+14,0]) {
                cylinder(h=width, r=2, center=false);}

            translate([6,mount_hole_spacing+14,0]) {
                cylinder(h=width, r=2, center=false);}
            }

            translate([-standoff_length,10.5-3.5,0]) {
                cube([standoff_length+1,7,width], center=false);}

            translate([-standoff_length,10.5-3.5+mount_hole_spacing,0]) {
                cube([standoff_length+1,7,width], center=false);}
        }
        // Clip fillet
        translate([3.5,2.5,-1]) {
            cylinder(h=width+2, r=0.5, center=false);}
        
        // Lock Screw and Nut
        translate([9+expand,-1,width/2]) rotate([-90,0,0]){
            cylinder(h=lock_screw_length+3, r=r_lock_screw, center=false);}

		translate([6.15+expand,5,-1]) {
            cube([5.7,lock_nut_height,width+2], center=false);}

        // 1. mount
        translate([-1-standoff_length,10.5,width/2]) rotate([0,90,0]){
            cylinder(h=standoff_length+8, r=r_mount_screw, center=false);}

		translate([2,7.65 - (((mount_nut_width * gain_adjust) - 5.7) / 2),-1]) {
            cube([mount_nut_height * gain_adjust,mount_nut_width * gain_adjust,width+2], center=false);}

        // 2. mount
        translate([-1-standoff_length,10.5+mount_hole_spacing,width/2]) rotate([0,90,0]){
            cylinder(h=standoff_length+8, r=r_mount_screw, center=false);}

		translate([2,7.65 - (((mount_nut_width * gain_adjust) - 5.7) / 2)+mount_hole_spacing,-1]) {
            cube([mount_nut_height * gain_adjust,mount_nut_width * gain_adjust,width+2], center=false);}
    }
}
